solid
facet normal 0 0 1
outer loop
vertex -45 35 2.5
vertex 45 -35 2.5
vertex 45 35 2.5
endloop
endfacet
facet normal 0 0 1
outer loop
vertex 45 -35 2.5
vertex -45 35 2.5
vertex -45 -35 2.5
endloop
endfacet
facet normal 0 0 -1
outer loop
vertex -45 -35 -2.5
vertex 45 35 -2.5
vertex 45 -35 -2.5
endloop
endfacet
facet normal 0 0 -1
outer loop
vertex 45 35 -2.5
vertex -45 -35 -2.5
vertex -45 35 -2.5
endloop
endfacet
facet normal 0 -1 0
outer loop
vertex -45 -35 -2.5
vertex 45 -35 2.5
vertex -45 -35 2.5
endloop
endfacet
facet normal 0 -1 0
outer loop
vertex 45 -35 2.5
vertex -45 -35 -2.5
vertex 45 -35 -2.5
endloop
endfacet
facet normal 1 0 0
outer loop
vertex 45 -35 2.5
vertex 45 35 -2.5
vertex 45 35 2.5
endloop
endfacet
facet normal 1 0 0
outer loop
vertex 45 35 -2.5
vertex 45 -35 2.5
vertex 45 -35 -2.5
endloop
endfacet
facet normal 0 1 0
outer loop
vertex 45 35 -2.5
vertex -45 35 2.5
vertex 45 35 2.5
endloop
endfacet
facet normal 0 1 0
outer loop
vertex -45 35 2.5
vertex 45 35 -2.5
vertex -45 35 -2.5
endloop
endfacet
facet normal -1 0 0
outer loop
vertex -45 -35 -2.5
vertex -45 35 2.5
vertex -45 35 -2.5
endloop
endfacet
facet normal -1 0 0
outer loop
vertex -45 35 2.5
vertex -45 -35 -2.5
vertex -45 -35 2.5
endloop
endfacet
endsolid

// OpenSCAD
// Starter file for task-018.
// Edit this file in OpenSCAD to complete the requested hard task.
$fn = 64;

plate_w = 90;
plate_d = 70;
plate_t = 5;
cube([plate_w, plate_d, plate_t], center=true);
